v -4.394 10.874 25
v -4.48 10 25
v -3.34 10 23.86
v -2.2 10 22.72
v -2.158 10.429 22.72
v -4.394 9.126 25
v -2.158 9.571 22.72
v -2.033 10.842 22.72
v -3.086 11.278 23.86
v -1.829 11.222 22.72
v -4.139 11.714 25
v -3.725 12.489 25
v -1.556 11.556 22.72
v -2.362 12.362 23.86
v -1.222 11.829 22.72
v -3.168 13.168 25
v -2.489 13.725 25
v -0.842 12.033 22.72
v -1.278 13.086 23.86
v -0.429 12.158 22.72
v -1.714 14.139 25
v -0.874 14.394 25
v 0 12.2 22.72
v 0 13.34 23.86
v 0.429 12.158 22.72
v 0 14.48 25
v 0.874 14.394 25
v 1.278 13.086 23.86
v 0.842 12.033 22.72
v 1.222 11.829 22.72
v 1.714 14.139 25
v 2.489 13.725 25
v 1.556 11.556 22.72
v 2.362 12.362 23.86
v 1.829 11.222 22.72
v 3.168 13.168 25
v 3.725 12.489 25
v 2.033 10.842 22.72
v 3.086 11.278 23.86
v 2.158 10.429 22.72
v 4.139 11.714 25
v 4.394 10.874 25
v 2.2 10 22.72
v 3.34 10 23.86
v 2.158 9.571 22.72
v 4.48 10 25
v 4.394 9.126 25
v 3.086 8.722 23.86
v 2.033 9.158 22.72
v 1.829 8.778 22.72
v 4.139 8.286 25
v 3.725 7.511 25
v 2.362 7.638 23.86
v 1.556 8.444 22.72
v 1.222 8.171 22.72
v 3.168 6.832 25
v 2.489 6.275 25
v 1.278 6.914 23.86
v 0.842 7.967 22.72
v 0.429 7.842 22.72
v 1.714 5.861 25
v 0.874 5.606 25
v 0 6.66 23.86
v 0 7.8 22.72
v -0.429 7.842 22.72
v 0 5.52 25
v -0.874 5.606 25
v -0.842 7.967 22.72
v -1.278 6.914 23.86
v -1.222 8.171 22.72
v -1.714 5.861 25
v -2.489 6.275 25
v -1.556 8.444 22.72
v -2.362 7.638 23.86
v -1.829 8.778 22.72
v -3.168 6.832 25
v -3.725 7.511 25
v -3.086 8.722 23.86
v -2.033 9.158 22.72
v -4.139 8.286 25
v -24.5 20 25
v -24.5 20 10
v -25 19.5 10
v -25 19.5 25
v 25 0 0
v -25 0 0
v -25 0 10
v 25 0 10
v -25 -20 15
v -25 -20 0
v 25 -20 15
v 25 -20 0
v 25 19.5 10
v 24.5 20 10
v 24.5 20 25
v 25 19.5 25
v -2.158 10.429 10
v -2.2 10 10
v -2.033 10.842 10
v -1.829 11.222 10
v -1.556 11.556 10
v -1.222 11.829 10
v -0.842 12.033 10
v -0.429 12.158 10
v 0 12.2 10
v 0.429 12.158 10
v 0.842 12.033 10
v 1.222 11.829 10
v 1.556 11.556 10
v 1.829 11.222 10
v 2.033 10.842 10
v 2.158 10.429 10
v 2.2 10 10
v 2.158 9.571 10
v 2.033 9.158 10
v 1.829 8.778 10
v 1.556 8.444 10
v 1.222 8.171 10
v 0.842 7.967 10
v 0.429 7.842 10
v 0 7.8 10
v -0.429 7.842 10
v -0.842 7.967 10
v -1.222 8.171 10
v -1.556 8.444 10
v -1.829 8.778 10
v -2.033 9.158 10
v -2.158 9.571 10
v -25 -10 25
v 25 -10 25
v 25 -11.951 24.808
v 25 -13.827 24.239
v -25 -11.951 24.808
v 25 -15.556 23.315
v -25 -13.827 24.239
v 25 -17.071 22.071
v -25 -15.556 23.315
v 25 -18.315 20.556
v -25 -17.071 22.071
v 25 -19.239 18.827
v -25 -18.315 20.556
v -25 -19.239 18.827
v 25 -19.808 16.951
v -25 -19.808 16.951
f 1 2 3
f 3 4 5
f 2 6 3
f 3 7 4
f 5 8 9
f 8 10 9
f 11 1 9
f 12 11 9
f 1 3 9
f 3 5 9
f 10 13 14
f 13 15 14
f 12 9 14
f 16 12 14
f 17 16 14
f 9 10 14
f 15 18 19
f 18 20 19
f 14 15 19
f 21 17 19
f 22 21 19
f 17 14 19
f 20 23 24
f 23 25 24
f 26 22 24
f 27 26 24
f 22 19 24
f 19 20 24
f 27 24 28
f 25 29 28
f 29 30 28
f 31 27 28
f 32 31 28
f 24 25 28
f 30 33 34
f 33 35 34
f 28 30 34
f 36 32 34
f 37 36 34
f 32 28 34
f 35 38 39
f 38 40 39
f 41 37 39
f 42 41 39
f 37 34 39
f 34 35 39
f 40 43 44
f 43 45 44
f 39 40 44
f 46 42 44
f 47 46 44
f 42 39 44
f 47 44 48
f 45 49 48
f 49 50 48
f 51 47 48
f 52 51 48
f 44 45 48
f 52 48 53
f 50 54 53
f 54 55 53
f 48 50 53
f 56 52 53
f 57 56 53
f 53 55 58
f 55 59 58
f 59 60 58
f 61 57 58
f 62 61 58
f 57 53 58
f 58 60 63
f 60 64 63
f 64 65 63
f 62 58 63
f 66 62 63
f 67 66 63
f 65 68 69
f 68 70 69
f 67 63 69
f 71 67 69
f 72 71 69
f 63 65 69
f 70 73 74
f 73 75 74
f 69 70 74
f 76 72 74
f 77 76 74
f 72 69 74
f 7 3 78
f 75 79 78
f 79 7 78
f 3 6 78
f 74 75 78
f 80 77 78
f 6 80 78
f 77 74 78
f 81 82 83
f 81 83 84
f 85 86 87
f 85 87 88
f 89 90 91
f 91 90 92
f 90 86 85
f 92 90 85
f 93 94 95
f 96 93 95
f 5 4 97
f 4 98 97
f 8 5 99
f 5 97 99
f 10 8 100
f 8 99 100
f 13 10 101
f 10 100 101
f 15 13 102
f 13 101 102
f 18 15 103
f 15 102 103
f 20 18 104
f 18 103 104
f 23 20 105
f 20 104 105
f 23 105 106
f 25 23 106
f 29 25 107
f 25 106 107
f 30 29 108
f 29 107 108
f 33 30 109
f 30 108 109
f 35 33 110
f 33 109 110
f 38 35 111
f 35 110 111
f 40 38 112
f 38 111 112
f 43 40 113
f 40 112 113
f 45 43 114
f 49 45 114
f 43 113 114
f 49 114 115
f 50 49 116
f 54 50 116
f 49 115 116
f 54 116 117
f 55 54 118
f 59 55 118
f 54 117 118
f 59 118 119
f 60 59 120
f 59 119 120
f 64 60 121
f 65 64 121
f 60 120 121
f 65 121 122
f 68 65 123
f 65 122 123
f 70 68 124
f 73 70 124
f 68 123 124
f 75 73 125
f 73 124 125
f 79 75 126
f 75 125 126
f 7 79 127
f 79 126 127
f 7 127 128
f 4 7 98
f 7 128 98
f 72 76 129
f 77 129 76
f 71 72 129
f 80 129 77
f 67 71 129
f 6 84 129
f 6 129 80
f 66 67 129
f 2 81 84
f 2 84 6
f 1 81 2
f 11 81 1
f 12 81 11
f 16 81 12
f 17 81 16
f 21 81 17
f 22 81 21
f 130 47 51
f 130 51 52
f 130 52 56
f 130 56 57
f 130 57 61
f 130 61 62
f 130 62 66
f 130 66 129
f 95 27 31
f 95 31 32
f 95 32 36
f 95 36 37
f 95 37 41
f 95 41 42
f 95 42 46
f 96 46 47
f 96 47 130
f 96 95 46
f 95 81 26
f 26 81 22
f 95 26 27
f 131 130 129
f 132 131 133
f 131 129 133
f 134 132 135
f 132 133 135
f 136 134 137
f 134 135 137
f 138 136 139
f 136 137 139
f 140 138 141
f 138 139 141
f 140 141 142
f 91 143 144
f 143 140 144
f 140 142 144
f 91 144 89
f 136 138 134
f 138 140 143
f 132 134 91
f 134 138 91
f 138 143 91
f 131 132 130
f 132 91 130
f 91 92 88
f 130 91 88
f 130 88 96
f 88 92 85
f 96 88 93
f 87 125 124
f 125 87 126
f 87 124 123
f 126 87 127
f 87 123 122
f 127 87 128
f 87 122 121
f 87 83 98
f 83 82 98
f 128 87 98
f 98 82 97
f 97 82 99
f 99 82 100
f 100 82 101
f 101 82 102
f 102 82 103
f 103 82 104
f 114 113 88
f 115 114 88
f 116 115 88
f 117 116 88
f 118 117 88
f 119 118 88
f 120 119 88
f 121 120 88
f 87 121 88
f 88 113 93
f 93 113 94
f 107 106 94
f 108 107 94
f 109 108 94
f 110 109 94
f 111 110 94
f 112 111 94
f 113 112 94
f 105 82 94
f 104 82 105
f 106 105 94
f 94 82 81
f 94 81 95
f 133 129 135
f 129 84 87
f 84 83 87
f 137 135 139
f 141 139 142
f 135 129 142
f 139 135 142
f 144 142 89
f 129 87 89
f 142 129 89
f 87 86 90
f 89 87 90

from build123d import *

# Parameters (mm, degrees)
F0_W           = 50
F0_H           = 20
F1_DEPTH       = 25
F2_DEPTH       = 10
F4_DEPTH       = 50.001
F6_D           = 4.4
F6_CSINK_D     = 8.96
F6_CSINK_ANGLE = 90
F7_SIZE        = 0.5


with BuildPart() as f1:
    # F0 (on Top) → F1 (new body)
    with BuildSketch(Plane.XY):
        with Locations((0, 10)):
            Rectangle(F0_W, F0_H)
        with Locations((0, -10)):
            Rectangle(F0_W, F0_H)
    extrude(amount=F1_DEPTH)

    # F0 (on Top) → F2 (cut)
    with BuildSketch(Plane.XY):
        with Locations((0, 10)):
            Rectangle(F0_W, F0_H)
    extrude(amount=F2_DEPTH, mode=Mode.SUBTRACT)

    # F3 (on face) → F4 (cut, through all)
    with BuildSketch(Plane(origin=(-25, 0, 0), x_dir=(0, -1, 0), z_dir=(-1, 0, 0))):
        with BuildLine():
            ThreePointArc((10, 25), (17.0710678119, 22.0710678119), (20, 15))
            Line((20, 15), (20, 25))
            Line((20, 25), (10, 25))
        make_face()
    extrude(amount=-F4_DEPTH, mode=Mode.SUBTRACT)

    # F6 (through all)
    with Locations(Plane.XY.offset(25)):
        with Locations((0, 10)):
            CounterSinkHole(F6_D / 2, F6_CSINK_D / 2, counter_sink_angle=F6_CSINK_ANGLE)

    # F7
    f7_edges = [f1.edges().sort_by_distance(p)[0] for p in [
        (25, 20, 17.5),
        (-25, 20, 17.5),
    ]]
    chamfer(f7_edges, length=F7_SIZE)


solid = f1.part
